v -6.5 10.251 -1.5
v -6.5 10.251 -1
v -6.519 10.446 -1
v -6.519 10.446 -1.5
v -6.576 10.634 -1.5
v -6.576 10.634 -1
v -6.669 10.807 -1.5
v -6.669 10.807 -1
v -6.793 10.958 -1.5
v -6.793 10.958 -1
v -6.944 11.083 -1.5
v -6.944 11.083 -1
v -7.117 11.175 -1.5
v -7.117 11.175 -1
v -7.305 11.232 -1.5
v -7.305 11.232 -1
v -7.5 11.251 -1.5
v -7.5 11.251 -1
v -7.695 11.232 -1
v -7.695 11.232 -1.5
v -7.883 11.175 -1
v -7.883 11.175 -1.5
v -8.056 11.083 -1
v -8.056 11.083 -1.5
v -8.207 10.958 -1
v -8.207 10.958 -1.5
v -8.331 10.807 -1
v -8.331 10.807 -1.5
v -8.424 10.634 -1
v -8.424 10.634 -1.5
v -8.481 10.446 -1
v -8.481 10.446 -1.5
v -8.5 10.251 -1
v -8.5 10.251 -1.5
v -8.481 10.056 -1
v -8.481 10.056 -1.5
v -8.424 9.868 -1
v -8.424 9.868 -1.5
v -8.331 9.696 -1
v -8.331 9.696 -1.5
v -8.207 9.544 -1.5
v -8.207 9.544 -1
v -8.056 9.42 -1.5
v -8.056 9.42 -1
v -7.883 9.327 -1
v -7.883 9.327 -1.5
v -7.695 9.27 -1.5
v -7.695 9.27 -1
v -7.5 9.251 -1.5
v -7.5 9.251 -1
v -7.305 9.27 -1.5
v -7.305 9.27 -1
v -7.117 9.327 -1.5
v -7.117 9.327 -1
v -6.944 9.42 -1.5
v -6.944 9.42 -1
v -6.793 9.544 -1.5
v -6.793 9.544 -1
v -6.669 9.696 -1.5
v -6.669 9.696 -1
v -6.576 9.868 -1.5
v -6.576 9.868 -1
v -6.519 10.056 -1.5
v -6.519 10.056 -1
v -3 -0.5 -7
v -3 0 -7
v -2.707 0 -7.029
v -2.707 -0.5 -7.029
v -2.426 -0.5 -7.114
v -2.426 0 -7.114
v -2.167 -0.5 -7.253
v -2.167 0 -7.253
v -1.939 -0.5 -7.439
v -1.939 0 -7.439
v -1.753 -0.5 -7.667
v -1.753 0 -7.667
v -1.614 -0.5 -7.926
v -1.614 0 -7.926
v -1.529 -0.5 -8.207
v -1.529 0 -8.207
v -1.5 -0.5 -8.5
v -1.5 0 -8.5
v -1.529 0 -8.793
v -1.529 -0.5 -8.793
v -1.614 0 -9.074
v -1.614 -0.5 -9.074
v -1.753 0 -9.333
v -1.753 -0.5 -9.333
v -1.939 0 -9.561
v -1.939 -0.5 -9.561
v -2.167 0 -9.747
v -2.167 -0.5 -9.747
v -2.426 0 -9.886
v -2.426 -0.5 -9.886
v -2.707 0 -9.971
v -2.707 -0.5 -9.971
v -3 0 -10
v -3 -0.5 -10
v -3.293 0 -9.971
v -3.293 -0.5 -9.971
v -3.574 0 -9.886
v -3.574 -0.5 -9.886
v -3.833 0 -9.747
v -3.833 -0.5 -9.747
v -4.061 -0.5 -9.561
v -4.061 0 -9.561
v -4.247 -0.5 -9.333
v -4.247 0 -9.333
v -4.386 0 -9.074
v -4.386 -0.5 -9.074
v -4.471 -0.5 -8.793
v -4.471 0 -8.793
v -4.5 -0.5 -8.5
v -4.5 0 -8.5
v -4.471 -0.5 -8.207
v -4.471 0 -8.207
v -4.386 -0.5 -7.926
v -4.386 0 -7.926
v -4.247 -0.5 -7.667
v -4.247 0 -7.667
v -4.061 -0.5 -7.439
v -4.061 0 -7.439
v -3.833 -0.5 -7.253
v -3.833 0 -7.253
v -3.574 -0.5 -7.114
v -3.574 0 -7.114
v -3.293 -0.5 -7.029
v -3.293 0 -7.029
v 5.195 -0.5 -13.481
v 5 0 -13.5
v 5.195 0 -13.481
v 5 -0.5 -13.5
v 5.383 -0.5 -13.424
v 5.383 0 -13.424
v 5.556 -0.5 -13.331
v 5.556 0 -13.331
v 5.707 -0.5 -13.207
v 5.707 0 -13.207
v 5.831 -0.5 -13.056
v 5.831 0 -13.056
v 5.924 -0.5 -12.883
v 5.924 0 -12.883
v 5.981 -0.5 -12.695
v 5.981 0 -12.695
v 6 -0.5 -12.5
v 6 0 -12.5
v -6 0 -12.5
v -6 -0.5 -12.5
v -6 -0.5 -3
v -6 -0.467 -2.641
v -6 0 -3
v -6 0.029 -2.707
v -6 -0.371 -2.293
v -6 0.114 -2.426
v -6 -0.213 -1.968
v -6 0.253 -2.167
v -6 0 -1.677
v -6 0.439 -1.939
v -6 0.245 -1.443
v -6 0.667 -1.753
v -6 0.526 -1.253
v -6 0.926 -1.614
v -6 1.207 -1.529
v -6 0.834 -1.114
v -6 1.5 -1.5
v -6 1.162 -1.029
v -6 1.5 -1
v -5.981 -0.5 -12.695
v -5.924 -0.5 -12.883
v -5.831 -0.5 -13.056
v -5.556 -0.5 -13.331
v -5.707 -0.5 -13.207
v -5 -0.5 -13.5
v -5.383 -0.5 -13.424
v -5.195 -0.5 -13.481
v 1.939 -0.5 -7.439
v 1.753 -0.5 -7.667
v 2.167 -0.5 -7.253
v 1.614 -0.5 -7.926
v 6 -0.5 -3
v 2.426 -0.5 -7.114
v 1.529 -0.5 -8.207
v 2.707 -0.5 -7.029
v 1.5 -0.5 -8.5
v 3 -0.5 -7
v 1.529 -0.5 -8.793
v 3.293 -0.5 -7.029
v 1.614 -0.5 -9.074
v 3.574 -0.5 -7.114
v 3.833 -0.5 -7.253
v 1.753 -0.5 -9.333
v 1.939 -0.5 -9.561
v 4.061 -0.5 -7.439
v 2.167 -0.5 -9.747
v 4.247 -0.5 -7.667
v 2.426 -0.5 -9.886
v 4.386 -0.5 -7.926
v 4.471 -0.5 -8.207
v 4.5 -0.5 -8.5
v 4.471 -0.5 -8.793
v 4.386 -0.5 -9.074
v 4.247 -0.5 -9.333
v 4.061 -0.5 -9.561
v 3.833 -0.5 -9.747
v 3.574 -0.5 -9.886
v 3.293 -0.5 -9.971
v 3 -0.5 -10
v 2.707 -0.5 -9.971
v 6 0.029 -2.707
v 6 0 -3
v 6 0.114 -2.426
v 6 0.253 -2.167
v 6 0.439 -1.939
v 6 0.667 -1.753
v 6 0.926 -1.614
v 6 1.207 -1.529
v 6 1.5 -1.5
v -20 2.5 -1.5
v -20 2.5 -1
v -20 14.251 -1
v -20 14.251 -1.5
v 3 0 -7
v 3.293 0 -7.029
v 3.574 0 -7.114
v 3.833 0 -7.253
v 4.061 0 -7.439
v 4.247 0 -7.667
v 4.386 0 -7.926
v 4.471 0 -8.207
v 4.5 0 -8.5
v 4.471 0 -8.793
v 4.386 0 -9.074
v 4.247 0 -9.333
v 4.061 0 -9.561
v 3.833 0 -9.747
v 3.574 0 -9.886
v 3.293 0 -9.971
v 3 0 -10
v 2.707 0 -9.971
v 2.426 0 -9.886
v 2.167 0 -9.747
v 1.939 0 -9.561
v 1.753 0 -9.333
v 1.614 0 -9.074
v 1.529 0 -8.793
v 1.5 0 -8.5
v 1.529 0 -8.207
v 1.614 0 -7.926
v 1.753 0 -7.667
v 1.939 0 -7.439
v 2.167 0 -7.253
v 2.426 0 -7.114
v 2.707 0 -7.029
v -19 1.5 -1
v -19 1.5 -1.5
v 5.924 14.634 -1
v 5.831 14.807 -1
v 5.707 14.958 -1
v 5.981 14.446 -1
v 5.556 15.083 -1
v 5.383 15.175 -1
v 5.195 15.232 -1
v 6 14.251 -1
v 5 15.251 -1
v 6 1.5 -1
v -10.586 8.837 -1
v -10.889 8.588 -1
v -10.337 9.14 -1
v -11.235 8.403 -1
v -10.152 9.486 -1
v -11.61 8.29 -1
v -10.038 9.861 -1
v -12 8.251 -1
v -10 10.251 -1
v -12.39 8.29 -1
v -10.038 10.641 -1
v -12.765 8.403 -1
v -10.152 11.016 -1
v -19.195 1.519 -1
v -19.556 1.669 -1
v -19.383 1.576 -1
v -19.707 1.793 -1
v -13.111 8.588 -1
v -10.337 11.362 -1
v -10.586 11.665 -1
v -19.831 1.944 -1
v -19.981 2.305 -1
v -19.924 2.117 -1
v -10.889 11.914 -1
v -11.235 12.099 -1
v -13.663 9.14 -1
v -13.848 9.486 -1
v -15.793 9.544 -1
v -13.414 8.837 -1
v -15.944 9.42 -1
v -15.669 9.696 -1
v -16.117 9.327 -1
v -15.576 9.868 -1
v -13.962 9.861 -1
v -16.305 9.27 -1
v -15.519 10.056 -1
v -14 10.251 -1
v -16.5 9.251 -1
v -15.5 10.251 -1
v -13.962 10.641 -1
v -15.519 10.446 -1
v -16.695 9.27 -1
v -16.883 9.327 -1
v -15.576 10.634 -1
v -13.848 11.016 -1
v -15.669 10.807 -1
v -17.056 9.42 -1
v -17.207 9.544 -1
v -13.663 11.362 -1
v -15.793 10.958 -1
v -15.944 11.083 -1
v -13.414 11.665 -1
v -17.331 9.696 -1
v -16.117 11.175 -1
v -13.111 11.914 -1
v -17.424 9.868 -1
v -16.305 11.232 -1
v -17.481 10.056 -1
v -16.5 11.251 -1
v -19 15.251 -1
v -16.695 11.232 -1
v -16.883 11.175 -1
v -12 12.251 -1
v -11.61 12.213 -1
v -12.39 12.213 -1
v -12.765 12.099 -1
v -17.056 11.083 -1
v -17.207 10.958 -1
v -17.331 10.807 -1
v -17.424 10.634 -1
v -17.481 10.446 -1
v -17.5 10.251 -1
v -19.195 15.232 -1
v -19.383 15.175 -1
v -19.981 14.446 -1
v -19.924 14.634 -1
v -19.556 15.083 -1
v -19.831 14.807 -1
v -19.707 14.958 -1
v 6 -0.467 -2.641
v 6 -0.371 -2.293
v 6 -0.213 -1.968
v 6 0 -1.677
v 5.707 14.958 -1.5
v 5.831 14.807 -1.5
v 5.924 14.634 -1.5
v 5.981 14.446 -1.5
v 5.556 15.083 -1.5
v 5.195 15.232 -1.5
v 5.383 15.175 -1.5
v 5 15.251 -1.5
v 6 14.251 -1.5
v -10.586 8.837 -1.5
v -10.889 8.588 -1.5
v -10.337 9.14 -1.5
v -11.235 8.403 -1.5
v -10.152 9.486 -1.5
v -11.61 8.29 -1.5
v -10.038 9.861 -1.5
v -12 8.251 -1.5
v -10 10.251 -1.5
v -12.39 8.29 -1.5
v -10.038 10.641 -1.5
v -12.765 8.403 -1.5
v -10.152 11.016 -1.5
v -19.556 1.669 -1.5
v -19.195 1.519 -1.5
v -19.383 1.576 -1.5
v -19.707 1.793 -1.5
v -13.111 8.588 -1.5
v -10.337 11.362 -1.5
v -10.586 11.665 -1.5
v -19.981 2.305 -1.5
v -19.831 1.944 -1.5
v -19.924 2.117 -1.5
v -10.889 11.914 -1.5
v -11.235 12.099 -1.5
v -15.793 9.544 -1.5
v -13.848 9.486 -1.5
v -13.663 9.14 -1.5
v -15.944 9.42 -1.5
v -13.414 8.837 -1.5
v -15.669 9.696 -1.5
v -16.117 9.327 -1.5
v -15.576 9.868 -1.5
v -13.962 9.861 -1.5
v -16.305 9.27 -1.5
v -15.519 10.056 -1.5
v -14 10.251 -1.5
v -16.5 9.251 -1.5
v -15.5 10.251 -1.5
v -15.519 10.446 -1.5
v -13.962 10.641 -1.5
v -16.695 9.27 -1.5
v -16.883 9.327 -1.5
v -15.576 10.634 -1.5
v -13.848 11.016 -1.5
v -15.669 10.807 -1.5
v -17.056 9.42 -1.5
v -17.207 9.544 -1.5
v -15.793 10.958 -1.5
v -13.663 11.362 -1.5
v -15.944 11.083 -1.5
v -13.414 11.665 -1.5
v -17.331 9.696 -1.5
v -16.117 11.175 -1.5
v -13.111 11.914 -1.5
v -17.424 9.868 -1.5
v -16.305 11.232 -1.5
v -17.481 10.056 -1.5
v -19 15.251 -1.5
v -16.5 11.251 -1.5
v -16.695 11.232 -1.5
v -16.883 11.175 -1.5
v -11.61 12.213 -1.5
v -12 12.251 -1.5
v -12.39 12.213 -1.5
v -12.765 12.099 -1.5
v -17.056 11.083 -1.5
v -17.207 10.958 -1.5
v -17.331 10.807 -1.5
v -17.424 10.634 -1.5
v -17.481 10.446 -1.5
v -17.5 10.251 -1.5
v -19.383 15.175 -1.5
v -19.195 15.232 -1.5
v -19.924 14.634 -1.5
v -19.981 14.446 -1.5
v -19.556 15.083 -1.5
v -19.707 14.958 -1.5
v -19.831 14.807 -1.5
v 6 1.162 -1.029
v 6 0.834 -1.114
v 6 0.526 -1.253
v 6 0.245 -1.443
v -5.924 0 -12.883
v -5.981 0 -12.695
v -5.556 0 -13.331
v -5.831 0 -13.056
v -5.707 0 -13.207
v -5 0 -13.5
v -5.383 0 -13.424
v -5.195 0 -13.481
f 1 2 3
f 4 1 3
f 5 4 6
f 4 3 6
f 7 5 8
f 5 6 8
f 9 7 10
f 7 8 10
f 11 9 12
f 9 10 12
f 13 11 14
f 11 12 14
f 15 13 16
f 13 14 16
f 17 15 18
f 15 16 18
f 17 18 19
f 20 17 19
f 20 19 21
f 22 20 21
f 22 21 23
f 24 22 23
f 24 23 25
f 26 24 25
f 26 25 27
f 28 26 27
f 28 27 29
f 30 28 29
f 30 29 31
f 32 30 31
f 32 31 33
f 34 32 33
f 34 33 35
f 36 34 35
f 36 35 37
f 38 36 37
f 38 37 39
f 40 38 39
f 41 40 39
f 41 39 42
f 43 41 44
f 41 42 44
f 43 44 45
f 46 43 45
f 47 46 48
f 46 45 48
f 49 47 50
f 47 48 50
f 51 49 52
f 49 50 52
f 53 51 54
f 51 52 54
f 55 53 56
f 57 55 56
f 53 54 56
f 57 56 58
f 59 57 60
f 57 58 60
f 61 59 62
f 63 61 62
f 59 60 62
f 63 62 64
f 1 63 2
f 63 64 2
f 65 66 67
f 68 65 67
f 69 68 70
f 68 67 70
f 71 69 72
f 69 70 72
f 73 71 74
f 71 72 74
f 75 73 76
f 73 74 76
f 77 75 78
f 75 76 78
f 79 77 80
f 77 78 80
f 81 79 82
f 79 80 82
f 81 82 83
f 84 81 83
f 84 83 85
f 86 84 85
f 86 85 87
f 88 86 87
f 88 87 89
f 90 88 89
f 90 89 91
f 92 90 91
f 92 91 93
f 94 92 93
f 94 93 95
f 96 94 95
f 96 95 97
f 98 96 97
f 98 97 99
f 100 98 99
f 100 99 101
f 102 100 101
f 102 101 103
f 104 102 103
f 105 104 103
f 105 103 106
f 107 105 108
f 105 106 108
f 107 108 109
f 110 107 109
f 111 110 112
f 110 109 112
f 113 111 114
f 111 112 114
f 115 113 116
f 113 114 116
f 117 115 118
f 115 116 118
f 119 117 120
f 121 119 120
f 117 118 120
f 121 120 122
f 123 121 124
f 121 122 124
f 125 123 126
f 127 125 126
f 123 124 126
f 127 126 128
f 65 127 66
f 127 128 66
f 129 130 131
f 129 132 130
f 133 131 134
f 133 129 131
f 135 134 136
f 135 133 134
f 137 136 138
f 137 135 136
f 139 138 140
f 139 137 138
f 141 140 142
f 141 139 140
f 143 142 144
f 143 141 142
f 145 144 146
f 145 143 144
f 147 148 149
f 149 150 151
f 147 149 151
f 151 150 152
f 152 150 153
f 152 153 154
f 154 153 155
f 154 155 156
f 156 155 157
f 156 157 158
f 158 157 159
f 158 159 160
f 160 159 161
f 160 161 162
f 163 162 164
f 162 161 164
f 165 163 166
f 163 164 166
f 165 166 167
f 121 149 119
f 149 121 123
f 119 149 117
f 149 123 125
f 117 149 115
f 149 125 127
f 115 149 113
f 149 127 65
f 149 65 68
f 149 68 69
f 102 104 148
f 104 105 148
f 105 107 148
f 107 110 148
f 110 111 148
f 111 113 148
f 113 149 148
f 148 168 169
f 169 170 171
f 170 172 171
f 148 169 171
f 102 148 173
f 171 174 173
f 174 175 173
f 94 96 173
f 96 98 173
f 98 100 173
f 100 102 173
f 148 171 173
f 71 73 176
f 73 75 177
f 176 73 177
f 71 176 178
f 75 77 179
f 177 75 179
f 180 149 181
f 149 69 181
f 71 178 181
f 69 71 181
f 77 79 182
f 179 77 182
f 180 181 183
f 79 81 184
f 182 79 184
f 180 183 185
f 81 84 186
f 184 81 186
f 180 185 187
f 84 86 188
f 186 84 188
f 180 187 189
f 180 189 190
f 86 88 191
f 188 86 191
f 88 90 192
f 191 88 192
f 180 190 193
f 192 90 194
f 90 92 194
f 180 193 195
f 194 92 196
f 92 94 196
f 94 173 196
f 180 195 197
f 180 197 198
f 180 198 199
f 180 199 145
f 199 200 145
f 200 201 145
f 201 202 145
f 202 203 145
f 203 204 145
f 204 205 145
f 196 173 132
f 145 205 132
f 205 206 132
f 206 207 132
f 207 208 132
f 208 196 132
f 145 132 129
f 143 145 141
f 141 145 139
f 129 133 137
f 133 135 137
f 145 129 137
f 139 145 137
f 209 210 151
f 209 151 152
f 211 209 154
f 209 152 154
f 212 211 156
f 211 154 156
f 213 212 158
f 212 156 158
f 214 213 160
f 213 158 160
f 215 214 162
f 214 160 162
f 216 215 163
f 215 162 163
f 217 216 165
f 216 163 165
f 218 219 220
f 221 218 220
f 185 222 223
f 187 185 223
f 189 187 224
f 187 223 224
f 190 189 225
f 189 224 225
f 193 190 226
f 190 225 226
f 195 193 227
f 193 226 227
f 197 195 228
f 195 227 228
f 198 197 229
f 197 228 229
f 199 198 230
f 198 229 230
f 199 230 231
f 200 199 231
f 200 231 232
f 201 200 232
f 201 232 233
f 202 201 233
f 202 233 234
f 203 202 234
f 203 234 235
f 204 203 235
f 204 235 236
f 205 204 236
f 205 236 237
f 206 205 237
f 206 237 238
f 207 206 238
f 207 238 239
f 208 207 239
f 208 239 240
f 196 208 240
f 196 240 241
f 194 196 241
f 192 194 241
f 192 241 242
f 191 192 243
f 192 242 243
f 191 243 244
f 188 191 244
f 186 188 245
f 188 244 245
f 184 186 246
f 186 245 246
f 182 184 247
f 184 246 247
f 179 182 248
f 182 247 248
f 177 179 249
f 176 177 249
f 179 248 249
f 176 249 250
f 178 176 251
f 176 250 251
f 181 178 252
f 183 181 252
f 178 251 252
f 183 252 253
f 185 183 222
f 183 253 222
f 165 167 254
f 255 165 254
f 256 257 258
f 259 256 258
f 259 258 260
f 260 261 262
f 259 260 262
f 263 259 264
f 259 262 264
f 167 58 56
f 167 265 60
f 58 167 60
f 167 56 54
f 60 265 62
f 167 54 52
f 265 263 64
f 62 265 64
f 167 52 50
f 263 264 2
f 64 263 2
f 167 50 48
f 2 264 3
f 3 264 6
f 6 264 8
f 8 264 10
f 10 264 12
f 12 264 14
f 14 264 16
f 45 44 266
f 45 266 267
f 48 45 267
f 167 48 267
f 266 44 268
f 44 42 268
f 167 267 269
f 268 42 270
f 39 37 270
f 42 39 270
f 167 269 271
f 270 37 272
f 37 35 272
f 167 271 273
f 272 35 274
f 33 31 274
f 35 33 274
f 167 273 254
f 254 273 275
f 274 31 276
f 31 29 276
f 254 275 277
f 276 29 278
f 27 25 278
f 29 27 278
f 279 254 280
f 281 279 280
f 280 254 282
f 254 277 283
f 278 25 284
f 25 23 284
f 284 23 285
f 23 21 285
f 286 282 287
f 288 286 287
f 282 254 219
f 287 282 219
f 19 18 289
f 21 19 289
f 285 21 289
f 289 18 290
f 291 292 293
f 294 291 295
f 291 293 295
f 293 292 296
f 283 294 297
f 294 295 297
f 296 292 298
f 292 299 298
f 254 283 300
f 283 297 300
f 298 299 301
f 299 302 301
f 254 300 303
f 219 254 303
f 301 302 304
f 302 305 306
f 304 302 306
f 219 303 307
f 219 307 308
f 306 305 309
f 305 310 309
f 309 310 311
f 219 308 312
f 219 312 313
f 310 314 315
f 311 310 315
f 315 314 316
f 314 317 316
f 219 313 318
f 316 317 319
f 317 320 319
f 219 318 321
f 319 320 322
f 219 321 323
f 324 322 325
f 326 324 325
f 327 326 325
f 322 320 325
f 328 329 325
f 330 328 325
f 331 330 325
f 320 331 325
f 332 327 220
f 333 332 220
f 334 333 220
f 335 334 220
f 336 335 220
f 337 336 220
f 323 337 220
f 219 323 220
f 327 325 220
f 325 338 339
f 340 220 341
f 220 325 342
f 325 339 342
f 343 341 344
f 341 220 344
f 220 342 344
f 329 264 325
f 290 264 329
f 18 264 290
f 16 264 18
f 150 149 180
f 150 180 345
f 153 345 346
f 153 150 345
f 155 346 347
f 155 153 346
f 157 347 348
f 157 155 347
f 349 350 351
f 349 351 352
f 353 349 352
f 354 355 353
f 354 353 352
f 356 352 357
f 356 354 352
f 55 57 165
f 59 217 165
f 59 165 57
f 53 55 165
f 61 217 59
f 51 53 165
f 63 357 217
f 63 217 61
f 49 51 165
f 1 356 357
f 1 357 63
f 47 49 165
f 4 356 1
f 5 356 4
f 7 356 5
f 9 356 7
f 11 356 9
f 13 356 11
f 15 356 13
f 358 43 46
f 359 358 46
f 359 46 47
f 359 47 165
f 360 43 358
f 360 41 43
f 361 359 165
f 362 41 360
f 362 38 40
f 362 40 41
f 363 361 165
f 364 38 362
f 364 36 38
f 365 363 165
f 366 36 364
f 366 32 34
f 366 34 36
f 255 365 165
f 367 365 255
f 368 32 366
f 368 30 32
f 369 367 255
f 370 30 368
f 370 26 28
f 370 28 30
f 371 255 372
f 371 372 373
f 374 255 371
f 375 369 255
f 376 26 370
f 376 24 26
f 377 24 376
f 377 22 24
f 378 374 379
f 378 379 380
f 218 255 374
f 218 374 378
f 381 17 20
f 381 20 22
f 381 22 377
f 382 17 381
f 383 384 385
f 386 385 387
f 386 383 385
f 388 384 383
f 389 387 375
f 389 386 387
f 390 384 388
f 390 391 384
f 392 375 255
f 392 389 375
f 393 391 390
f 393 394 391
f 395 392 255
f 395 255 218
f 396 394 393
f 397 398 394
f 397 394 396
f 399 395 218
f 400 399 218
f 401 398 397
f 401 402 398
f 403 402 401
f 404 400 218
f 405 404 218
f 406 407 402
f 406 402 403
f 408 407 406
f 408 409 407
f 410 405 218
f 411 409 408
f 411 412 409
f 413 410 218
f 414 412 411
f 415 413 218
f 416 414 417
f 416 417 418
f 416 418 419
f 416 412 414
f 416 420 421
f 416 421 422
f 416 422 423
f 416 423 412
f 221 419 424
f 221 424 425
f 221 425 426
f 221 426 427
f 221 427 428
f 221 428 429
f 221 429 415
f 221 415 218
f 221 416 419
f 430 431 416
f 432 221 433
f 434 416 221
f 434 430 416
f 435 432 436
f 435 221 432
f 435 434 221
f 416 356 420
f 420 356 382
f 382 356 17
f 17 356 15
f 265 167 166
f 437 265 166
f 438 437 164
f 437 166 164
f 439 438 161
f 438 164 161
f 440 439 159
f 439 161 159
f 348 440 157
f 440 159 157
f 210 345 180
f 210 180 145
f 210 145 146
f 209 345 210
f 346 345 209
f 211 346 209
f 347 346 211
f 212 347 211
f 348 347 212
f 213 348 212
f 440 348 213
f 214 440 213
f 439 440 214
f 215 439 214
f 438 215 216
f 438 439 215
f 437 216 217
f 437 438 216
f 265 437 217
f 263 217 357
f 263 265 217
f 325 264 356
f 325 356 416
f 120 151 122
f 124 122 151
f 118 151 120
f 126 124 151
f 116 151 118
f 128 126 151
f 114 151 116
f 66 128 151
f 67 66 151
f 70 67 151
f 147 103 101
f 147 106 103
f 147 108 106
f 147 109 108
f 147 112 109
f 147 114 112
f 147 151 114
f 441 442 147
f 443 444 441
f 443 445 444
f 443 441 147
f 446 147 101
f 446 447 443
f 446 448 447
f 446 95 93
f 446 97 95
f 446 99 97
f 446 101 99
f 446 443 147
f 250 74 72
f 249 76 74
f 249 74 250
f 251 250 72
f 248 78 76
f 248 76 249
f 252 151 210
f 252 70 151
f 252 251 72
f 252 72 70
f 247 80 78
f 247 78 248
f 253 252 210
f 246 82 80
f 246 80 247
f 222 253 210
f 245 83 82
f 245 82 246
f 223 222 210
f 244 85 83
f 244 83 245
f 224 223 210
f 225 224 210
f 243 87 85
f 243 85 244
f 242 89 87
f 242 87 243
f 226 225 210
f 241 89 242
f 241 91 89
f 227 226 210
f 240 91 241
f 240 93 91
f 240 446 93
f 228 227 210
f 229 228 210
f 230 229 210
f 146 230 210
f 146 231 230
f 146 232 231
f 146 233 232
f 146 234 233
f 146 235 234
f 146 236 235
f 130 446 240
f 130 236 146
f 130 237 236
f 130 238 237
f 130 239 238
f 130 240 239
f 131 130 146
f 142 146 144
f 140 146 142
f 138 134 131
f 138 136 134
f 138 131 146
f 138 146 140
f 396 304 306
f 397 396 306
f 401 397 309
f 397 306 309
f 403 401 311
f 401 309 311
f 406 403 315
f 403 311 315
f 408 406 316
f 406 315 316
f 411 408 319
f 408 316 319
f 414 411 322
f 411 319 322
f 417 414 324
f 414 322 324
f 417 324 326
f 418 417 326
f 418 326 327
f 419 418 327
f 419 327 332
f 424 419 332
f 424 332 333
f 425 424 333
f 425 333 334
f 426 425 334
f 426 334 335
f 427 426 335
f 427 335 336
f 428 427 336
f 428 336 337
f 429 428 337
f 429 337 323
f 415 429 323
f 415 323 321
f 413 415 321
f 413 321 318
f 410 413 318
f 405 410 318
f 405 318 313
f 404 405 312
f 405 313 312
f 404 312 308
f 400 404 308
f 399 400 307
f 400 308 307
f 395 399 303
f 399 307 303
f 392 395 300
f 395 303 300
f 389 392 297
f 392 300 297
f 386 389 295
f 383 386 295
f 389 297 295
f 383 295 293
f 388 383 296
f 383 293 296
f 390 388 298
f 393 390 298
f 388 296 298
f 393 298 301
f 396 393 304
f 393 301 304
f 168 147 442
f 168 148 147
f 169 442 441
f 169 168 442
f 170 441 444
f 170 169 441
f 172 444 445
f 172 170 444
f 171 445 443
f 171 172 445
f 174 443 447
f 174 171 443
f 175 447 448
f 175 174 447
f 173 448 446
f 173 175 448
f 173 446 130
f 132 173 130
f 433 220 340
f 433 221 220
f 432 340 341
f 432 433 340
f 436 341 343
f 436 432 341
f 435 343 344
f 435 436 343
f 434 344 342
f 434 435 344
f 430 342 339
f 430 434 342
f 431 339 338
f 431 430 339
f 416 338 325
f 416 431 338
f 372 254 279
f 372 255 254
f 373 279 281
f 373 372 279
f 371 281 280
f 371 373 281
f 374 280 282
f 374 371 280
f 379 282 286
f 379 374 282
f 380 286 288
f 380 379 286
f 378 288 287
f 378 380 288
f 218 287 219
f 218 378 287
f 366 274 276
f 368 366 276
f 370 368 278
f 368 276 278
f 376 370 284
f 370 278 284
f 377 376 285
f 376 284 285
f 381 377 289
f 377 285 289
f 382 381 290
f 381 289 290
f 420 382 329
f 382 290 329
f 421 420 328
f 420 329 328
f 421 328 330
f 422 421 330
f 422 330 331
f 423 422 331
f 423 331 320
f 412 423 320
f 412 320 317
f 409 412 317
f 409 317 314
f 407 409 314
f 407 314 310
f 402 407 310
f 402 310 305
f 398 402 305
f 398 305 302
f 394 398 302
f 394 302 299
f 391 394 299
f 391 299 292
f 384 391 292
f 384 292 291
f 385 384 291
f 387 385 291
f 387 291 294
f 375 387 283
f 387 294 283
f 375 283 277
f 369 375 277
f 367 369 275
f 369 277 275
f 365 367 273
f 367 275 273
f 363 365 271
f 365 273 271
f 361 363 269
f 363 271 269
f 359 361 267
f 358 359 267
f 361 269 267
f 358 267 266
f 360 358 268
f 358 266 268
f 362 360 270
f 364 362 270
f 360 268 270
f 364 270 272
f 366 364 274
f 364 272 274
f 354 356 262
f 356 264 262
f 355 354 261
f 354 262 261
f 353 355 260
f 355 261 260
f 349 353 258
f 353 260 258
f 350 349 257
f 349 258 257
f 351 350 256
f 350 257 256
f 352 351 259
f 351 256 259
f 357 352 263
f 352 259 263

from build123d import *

# Parameters (mm, degrees)
SKETCH1_W              = 12
SKETCH1_H              = 27
BASE_FLANGE1_DEPTH     = 0.5
SKETCHED_START         = -6
SKETCHED_BEND1_DEPTH   = 12
SKETCHED_BEND1_2_DEPTH = 12
TAB1_START             = -0.5
TAB1_OUTLINE_W         = 14
TAB1_OUTLINE_H         = 13.751106428
TAB1_DEPTH             = 0.5
SKETCH8_R              = 1
SKETCH8_R_2            = 2
CUT_EXTRUDE1_DEPTH     = 10
SKETCH9_R              = 1.5
CUT_EXTRUDE2_DEPTH     = 10
FILLET1_R              = 1


# Read off the part's stored shape, not the designer's step: Sketched Bend1, Tab1
# Sheet-metal steps are written as plain solids
with BuildPart() as part:
    # Sketch1 → Base-Flange1 (new body)
    with BuildSketch(Plane(origin=(0, 0, 0), x_dir=(1, 0, 0), z_dir=(0, 1, 0))):
        Rectangle(SKETCH1_W, SKETCH1_H)
    extrude(amount=-BASE_FLANGE1_DEPTH)

    # Sketched Bend1 outline → Sketched Bend1 (cut)
    with BuildSketch(Plane.YZ.offset(SKETCHED_START)):
        with BuildLine():
            ThreePointArc((-0.5, -3), (-0.370828693, -2.292893219), (0, -1.677124345))
            Line((0, -1.677124345), (0, 13.5))
            Line((0, 13.5), (-0.5, 13.5))
            Line((-0.5, 13.5), (-0.5, -3))
        make_face()
    extrude(amount=SKETCHED_BEND1_DEPTH, mode=Mode.SUBTRACT)

    # Sketched Bend1 2 outline → Sketched Bend1 2 (add)
    with BuildSketch(Plane.YZ.offset(SKETCHED_START)):
        with BuildLine():
            ThreePointArc((0, -3), (0.439339828, -1.939339828), (1.5, -1.5))
            Line((1.5, -1.5), (15.251106428, -1.5))
            Line((15.251106428, -1.5), (15.251106428, -1))
            Line((15.251106428, -1), (1.5, -1))
            ThreePointArc((1.5, -1), (0.677124344, -1.177124345), (0, -1.677124345))
            Line((0, -1.677124345), (0, -3))
        make_face()
    extrude(amount=SKETCHED_BEND1_2_DEPTH)

    # Tab1 outline → Tab1 (add)
    with BuildSketch(Plane(origin=(0, 0, -1.5), x_dir=(-1, 0, 0), z_dir=(0, 0, -1)).offset(TAB1_START)):
        with Locations((13, 8.375553214)):
            Rectangle(TAB1_OUTLINE_W, TAB1_OUTLINE_H)
    extrude(amount=TAB1_DEPTH)

    # Sketch8 → Cut-Extrude1 (cut)
    with BuildSketch(Plane.XY.offset(-1)):
        with Locations((-16.5, 10.251106428)):
            Circle(SKETCH8_R)
        with Locations((-7.5, 10.251106428)):
            Circle(SKETCH8_R)
        with Locations((-12, 10.251106428)):
            Circle(SKETCH8_R_2)
    extrude(amount=-CUT_EXTRUDE1_DEPTH, mode=Mode.SUBTRACT)

    # Sketch9 → Cut-Extrude2 (cut)
    with BuildSketch(Plane(origin=(0, 0, 0), x_dir=(1, 0, 0), z_dir=(0, 1, 0))):
        with Locations(Location((-3, 8.5, 0), (0, 0, 270))):
            Circle(SKETCH9_R)
        with Locations(Location((3, 8.5, 0), (0, 0, 270))):
            Circle(SKETCH9_R)
    extrude(amount=-CUT_EXTRUDE2_DEPTH, mode=Mode.SUBTRACT)

    # Fillet1
    fillet1_edges = [part.edges().sort_by_distance(p)[0] for p in [
        (-6, -0.25, -13.5),
        (6, -0.25, -13.5),
        (-20, 15.251106428, -1.25),
        (-20, 1.5, -1.25),
        (6, 15.251106428, -1.25),
    ]]
    fillet(fillet1_edges, radius=FILLET1_R)


solid = part.part
